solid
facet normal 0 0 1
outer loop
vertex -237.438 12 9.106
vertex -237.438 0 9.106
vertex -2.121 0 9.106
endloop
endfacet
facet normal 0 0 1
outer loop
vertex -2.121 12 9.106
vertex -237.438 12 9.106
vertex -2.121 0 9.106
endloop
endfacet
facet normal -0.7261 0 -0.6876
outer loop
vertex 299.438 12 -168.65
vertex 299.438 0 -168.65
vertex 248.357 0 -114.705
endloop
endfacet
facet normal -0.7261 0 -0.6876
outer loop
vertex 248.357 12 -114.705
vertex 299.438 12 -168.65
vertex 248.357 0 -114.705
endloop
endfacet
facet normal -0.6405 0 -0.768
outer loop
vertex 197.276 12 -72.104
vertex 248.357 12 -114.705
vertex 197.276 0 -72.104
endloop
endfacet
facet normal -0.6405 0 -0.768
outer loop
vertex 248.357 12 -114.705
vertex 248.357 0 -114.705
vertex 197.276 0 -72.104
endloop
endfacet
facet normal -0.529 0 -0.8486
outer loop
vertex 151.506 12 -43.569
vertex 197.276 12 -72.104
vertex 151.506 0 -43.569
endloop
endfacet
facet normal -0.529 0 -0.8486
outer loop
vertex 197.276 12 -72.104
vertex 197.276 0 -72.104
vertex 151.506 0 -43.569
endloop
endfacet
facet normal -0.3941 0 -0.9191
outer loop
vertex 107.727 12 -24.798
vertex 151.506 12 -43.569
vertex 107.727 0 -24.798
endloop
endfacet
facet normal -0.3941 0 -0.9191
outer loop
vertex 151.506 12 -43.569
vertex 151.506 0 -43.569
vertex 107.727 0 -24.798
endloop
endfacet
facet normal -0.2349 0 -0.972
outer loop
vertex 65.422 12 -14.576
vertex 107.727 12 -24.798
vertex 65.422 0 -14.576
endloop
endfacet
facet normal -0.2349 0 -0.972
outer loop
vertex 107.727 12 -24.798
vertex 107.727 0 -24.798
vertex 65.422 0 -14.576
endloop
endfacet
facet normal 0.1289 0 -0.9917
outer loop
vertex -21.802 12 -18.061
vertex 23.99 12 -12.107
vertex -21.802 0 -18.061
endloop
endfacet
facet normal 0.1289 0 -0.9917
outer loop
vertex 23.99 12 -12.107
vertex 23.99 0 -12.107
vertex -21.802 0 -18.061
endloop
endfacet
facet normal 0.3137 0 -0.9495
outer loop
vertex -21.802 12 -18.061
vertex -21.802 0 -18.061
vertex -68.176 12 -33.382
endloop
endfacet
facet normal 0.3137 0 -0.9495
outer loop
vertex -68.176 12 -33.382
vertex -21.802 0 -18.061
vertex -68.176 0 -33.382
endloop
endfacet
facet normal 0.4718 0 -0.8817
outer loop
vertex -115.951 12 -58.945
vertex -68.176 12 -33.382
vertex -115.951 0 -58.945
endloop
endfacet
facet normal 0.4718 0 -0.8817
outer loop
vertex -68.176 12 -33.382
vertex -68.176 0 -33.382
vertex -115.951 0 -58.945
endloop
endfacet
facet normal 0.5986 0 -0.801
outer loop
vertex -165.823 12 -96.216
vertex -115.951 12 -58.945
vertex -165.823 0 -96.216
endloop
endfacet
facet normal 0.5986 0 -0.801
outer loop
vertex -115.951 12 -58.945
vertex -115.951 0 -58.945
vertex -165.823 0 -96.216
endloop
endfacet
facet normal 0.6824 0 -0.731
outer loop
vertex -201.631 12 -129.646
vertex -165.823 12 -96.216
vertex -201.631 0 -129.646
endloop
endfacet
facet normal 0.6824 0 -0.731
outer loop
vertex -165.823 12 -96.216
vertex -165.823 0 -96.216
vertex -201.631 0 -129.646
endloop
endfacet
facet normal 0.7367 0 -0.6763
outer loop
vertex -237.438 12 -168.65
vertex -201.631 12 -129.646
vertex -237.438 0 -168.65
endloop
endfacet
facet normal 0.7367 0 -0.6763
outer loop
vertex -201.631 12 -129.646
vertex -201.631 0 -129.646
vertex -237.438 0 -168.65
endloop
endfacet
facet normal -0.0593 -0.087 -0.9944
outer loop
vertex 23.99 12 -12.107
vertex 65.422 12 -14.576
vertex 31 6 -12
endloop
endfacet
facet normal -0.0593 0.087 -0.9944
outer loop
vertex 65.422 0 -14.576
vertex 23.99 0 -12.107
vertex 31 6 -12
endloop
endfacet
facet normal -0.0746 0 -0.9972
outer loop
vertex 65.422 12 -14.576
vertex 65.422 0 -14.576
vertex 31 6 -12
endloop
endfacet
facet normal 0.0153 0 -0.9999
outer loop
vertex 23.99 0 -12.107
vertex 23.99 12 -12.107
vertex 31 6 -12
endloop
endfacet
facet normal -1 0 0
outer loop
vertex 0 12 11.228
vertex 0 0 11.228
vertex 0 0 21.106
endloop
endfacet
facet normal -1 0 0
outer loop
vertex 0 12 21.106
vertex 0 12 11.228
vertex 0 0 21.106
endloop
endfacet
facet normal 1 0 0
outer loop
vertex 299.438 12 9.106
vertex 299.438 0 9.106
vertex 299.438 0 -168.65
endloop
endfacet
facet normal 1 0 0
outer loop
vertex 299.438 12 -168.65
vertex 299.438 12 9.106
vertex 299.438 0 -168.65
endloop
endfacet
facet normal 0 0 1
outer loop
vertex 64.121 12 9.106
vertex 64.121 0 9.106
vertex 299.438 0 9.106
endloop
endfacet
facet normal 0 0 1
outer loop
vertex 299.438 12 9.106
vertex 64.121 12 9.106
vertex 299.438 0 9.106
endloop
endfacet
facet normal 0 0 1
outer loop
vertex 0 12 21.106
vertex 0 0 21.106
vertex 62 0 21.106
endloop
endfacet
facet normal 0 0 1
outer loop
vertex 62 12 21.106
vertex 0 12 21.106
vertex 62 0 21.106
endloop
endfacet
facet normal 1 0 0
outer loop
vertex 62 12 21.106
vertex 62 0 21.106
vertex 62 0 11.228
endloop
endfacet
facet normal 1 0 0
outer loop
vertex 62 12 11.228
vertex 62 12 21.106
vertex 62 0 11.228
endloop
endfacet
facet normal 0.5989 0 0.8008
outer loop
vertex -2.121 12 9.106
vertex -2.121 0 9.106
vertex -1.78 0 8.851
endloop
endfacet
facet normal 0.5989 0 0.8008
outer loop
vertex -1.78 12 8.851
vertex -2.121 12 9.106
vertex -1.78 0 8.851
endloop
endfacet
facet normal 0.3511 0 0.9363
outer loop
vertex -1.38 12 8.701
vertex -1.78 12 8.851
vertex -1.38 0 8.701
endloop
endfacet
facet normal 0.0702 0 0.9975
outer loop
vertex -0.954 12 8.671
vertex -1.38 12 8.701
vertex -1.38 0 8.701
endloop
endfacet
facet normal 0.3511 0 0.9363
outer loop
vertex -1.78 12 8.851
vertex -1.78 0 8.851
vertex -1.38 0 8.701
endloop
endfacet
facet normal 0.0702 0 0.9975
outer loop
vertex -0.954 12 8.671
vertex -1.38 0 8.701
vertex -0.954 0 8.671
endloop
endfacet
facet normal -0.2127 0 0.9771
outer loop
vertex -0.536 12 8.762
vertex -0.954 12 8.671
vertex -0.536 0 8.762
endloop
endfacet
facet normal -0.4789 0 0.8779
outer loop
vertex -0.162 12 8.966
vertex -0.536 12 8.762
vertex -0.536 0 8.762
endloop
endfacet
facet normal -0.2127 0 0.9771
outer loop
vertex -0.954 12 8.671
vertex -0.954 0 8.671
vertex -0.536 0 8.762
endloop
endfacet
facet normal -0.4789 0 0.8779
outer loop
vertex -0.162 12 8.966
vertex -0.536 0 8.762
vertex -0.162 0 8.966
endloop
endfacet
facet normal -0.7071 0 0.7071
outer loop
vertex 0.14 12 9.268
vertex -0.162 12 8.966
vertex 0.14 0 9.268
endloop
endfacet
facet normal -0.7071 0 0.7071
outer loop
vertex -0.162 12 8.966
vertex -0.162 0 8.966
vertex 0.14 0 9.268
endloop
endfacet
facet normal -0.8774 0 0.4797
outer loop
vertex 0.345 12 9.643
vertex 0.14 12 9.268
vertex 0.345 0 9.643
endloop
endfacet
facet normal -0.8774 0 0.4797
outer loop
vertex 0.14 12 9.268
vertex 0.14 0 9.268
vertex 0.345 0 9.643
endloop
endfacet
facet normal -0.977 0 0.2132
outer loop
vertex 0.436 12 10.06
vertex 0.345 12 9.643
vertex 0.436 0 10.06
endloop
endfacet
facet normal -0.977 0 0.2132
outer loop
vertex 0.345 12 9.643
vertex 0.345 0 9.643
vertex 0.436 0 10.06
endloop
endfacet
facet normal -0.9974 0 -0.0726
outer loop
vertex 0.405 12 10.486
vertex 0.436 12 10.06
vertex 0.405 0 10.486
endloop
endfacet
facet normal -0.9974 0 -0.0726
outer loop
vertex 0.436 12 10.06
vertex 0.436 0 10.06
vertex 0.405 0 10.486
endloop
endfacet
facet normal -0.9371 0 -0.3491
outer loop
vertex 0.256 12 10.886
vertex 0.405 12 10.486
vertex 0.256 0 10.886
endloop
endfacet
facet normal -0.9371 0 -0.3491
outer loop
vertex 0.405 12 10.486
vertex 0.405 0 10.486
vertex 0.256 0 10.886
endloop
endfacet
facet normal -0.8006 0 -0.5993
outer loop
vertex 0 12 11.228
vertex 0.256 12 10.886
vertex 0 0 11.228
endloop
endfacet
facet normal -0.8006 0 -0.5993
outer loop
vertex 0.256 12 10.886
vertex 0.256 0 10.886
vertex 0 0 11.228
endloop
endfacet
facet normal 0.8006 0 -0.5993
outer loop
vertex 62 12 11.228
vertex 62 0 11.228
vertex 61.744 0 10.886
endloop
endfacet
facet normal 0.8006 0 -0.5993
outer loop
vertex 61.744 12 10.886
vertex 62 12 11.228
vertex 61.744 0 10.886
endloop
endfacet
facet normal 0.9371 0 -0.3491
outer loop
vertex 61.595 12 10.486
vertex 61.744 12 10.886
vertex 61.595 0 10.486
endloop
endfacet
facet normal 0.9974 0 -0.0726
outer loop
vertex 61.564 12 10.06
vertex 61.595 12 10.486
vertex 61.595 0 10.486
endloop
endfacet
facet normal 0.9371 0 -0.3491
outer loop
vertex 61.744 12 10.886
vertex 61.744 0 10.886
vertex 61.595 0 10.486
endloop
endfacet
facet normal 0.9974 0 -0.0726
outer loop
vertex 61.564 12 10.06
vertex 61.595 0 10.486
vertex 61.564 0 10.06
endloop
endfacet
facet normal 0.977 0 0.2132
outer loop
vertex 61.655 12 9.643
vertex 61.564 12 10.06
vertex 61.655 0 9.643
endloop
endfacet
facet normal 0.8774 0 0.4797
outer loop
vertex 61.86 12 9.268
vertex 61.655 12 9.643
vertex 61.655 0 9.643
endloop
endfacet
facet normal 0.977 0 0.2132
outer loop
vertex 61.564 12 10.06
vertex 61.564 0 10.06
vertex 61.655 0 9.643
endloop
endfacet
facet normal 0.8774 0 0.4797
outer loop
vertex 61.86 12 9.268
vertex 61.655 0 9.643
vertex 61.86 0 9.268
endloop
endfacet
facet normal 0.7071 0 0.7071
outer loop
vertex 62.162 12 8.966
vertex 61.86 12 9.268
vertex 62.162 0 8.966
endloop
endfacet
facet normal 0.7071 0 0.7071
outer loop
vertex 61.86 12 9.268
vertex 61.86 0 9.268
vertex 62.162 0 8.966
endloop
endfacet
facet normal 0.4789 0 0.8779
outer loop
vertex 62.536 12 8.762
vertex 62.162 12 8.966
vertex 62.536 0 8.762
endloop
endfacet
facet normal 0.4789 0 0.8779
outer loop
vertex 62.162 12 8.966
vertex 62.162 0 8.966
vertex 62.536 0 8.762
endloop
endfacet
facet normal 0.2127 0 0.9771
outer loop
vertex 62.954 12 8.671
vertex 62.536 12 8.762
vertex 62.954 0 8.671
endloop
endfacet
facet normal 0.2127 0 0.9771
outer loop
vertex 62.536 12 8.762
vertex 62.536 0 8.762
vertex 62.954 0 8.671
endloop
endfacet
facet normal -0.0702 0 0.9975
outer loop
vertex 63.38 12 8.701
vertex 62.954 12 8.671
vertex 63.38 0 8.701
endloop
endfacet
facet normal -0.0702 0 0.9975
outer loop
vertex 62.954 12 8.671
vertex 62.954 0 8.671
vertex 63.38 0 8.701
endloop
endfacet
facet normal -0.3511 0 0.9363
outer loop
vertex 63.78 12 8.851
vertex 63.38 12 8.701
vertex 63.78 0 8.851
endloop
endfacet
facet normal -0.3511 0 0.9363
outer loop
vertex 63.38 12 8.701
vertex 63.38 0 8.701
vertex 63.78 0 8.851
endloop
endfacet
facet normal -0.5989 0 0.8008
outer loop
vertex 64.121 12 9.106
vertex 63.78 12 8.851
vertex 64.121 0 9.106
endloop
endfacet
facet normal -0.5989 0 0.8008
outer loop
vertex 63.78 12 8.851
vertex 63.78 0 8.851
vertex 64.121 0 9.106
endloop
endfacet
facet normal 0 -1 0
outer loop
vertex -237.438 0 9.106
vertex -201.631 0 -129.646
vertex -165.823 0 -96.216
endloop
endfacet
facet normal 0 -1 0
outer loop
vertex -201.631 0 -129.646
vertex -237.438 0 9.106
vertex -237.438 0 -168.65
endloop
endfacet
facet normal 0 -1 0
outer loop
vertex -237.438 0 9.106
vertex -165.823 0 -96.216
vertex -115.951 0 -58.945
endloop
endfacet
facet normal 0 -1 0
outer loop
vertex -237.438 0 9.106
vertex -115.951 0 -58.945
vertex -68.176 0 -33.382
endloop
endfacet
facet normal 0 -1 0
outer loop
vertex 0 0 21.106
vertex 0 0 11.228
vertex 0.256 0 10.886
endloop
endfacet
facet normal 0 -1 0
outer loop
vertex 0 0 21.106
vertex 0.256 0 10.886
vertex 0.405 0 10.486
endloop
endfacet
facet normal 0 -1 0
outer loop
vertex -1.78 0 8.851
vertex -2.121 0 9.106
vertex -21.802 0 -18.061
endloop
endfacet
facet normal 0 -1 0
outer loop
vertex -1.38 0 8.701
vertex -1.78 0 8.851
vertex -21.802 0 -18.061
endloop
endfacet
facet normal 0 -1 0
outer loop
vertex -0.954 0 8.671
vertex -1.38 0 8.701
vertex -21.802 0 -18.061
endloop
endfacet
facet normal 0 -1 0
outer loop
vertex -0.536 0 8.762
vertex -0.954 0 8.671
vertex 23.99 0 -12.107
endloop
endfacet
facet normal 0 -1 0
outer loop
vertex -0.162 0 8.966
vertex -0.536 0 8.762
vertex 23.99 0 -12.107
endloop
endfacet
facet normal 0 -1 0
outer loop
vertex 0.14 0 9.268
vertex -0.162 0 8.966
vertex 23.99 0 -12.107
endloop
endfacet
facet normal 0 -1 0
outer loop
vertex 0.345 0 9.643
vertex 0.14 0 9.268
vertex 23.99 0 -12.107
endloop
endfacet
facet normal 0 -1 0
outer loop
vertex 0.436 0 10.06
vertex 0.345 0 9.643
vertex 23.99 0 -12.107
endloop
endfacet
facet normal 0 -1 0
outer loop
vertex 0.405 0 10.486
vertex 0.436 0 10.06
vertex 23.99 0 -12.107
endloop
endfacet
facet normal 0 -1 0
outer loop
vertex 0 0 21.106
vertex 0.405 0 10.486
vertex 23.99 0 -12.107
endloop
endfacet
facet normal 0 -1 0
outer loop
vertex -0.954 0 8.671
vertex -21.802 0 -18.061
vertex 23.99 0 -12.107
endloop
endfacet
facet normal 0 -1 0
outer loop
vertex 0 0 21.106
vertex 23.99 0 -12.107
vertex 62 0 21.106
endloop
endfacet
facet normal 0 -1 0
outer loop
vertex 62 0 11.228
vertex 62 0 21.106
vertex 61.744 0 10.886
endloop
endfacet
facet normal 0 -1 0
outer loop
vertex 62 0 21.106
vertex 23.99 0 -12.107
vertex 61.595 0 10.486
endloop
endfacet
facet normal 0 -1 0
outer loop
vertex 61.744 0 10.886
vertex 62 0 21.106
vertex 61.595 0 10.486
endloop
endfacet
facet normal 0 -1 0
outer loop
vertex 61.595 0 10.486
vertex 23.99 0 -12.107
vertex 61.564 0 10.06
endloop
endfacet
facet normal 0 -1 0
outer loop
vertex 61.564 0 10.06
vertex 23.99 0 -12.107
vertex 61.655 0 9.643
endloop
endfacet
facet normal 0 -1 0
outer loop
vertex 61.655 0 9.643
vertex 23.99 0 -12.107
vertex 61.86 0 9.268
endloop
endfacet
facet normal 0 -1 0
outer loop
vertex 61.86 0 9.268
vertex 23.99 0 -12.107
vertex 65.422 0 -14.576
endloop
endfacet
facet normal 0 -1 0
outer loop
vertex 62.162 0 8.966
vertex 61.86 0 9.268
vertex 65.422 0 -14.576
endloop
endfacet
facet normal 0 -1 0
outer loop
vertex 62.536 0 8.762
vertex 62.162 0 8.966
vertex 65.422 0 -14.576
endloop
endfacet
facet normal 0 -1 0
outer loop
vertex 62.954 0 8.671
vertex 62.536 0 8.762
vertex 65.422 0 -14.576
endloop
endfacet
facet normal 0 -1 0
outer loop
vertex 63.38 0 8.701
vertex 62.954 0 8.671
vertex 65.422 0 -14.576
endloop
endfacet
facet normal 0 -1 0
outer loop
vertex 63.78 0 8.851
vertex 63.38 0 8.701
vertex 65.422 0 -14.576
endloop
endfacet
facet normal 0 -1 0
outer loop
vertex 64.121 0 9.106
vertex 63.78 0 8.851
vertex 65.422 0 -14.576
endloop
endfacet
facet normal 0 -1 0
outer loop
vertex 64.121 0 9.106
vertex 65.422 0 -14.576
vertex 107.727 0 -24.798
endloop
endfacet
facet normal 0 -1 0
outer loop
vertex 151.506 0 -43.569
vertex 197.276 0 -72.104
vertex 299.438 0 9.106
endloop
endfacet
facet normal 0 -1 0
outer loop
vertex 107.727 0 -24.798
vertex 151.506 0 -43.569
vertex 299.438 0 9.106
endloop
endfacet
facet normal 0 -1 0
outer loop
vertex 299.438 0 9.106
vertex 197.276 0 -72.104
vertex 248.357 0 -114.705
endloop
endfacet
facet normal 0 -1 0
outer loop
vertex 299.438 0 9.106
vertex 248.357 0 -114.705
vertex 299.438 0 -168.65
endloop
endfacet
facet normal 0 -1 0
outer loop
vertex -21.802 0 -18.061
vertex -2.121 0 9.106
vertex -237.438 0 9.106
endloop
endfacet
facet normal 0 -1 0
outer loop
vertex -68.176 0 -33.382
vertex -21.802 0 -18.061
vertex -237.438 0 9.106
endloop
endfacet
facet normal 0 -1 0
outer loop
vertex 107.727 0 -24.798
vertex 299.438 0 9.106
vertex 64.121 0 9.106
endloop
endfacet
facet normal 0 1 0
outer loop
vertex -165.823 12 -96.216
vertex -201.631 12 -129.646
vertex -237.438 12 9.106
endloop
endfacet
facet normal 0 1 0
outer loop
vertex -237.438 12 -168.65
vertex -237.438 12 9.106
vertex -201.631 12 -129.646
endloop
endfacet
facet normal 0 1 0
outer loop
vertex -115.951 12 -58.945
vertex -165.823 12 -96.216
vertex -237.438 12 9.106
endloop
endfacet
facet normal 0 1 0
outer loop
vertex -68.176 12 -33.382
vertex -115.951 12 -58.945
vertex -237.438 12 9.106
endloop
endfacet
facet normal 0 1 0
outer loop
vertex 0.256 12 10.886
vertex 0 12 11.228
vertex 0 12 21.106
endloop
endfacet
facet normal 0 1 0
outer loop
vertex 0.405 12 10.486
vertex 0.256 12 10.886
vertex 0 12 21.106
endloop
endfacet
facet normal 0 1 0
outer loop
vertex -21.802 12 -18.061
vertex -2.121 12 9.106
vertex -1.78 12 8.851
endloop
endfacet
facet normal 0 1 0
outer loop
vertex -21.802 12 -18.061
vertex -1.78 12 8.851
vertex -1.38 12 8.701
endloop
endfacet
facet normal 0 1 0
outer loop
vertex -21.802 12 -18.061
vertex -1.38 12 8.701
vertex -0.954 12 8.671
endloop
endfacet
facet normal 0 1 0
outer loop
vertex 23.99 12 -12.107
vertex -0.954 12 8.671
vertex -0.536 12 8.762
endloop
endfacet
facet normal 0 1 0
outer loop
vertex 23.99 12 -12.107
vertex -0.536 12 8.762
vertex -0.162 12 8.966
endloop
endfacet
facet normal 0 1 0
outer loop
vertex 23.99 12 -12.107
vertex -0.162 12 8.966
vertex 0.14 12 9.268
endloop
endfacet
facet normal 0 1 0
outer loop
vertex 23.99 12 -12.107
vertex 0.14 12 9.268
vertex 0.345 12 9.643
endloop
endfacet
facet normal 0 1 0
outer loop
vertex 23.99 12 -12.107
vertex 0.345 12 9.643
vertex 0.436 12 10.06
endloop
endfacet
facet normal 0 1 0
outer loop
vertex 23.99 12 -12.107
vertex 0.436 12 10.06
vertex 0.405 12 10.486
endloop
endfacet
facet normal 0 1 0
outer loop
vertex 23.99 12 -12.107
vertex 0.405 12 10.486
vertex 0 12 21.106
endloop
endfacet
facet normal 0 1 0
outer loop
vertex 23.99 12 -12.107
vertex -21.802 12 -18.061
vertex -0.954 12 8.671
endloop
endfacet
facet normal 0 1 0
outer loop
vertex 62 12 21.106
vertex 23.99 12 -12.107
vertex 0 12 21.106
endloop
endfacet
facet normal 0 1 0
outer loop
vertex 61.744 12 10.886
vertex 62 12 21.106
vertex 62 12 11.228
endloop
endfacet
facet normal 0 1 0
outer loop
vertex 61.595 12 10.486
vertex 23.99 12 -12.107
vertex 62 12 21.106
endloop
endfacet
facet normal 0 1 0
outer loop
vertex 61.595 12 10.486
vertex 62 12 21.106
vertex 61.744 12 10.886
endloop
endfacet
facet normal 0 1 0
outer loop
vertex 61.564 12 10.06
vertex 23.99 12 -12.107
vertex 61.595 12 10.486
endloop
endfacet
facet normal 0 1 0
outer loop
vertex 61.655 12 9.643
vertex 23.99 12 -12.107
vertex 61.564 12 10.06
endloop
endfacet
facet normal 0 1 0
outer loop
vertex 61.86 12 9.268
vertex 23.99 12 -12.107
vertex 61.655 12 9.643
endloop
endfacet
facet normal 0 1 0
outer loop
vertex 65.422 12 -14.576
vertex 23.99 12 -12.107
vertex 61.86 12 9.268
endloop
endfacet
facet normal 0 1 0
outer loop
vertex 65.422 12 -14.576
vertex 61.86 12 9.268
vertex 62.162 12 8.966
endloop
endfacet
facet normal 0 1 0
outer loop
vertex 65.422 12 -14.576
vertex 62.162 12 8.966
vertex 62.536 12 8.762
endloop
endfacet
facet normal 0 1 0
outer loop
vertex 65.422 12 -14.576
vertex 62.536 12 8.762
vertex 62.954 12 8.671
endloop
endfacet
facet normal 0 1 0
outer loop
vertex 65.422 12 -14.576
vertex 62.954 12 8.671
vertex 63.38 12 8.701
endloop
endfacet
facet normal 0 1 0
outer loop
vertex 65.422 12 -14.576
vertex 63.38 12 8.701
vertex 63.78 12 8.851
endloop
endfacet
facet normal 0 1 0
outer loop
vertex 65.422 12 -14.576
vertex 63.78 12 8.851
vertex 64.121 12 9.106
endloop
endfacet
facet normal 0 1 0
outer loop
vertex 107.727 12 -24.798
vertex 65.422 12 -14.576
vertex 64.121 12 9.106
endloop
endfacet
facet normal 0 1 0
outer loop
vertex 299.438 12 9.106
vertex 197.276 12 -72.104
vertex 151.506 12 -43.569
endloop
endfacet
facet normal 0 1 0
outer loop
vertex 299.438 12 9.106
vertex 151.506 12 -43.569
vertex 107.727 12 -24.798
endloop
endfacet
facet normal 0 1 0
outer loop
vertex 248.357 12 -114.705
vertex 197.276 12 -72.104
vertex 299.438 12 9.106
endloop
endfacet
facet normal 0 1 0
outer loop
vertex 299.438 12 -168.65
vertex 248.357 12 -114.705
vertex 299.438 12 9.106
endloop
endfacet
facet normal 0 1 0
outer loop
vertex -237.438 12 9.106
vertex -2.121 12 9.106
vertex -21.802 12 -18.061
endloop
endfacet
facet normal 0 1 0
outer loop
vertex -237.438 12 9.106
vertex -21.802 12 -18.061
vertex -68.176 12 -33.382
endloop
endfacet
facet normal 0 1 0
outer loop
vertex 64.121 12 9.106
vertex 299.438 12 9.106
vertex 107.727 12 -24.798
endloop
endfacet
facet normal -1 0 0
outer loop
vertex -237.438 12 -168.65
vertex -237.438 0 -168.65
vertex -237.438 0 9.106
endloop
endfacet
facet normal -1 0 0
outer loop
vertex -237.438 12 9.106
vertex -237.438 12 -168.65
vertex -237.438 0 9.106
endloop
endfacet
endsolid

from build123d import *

# Parameters (mm, degrees)
SALIENTE_EXTRUIR1_DEPTH = 12


with BuildPart() as part:
    # Croquis1 → Saliente-Extruir1 (new body)
    with BuildSketch(Plane(origin=(0, 0, 0), x_dir=(1, 0, 0), z_dir=(0, 1, 0))):
        with BuildLine():
            Line((-237.438208893, 168.650156508), (-237.438208893, -9.106373442))
            Line((-237.438208893, -9.106373442), (-2.121320344, -9.106373442))
            ThreePointArc((-2.121320344, -9.106373442), (0, -9.106373442), (0, -11.227693785))
            Line((0, -11.227693785), (0, -21.106373442))
            Line((0, -21.106373442), (31, -21.106373442))
            Line((31, -21.106373442), (62, -21.106373442))
            Line((62, -21.106373442), (62, -11.227693785))
            ThreePointArc((62, -11.227693785), (62, -9.106373442), (64.121320344, -9.106373442))
            Line((64.121320344, -9.106373442), (299.438208893, -9.106373442))
            Line((299.438208893, -9.106373442), (299.438208893, 168.650156508))
            add(Edge.make_bspline(
                [(299.438208893, 168.650156508), (165.219104447, 12), (31, 12)],
                knots=[0, 0, 0, 1, 1, 1], degree=2))
            add(Edge.make_bspline(
                [(31, 12), (-103.219104447, 12), (-237.438208893, 168.650156508)],
                knots=[0, 0, 0, 1, 1, 1], degree=2))
        make_face()
    extrude(amount=SALIENTE_EXTRUIR1_DEPTH)


solid = part.part
